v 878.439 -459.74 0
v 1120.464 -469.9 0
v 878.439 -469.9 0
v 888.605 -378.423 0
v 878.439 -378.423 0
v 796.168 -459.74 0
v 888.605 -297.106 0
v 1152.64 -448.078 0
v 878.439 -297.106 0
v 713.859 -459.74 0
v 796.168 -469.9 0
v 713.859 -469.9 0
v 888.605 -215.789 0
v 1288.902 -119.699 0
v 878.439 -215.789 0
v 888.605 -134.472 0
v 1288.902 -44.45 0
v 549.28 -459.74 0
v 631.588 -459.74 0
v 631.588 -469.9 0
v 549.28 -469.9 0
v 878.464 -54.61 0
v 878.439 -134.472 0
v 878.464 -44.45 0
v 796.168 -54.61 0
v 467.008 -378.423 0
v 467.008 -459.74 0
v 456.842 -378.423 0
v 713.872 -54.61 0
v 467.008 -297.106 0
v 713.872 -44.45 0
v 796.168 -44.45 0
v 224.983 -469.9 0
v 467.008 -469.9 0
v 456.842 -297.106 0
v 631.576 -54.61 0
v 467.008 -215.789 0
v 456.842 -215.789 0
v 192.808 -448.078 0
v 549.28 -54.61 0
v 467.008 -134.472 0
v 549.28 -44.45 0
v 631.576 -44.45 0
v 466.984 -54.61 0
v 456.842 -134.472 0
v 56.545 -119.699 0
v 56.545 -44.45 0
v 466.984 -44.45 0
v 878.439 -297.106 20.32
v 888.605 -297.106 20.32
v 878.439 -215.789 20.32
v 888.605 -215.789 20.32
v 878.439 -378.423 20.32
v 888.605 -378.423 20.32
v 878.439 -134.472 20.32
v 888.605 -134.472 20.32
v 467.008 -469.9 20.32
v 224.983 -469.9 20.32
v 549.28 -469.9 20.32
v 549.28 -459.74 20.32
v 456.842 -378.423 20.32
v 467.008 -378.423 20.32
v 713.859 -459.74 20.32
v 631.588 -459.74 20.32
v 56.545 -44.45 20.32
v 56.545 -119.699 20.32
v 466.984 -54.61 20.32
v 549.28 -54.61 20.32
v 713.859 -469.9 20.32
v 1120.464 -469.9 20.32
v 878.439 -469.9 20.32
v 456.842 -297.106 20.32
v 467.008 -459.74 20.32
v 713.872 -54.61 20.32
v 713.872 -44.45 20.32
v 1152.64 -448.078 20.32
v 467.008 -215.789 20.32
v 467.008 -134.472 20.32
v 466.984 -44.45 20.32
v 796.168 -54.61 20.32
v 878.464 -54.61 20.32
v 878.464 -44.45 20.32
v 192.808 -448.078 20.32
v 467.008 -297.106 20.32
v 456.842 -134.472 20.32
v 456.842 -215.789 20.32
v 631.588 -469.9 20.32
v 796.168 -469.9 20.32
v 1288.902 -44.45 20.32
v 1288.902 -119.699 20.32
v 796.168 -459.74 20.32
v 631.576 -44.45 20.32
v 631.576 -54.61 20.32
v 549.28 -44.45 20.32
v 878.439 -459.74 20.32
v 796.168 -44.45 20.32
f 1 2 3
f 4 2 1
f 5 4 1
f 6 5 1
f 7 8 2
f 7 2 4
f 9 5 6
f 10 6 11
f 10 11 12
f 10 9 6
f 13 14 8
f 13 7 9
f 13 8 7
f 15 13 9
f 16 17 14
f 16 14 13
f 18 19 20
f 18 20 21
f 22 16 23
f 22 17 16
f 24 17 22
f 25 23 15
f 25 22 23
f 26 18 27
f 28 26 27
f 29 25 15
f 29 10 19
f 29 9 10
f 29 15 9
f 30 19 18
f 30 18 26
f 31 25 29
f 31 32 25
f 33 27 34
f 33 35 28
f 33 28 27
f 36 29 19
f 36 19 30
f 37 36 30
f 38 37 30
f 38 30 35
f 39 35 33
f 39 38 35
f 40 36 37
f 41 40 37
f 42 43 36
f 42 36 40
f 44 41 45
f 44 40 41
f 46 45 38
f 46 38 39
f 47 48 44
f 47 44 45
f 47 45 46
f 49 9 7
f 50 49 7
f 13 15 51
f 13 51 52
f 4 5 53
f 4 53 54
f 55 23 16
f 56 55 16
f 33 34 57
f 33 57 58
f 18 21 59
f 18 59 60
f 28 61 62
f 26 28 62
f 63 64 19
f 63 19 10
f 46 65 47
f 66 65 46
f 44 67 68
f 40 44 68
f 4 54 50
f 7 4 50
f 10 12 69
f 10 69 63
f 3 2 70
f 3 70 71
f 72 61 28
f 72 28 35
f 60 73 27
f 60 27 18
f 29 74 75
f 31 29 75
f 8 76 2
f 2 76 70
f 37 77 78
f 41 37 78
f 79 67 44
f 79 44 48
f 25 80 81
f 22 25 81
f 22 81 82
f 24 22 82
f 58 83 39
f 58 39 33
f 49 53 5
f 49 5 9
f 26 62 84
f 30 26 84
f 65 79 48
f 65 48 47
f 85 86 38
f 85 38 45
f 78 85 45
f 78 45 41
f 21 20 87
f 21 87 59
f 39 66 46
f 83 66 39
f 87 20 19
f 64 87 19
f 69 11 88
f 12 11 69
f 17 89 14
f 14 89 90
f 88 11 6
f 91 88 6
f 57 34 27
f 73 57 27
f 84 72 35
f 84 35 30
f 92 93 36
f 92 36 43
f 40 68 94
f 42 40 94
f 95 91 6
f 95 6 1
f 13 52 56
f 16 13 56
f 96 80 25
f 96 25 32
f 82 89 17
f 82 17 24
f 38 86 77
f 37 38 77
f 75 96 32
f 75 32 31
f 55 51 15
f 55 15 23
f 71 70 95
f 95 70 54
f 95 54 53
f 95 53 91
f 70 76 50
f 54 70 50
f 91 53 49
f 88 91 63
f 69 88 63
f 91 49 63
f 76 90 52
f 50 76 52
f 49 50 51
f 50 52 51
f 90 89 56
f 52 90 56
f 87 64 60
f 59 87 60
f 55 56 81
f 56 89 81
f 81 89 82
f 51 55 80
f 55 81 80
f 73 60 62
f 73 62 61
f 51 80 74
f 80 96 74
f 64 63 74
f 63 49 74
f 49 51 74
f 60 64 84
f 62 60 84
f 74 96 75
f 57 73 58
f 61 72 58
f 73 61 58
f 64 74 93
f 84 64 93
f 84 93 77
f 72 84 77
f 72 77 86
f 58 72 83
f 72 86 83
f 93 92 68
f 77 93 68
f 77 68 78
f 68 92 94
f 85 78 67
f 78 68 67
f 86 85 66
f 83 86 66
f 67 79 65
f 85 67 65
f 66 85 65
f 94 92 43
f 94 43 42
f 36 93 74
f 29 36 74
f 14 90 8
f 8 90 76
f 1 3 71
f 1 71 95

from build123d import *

# Parameters (mm, degrees)
BOSS_EXTRUDE1_DEPTH = 20.32
SKETCH2_W           = 10.166490401
SKETCH2_H           = 81.316938585
SKETCH2_W_2         = 10.166490402
SKETCH2_H_2         = 81.316938584
SKETCH2_W_3         = 82.271298803
SKETCH2_H_3         = 10.16
CUT_EXTRUDE2_DEPTH  = 137.414
CUT_EXTRUDE3_DEPTH  = 21.3200001
SKETCH5_W           = 82.296
SKETCH5_H           = 10.16
CUT_EXTRUDE4_DEPTH  = 21.3200001
CUT_EXTRUDE5_DEPTH  = 21.3200001


with BuildPart() as part:
    # Sketch1 → Boss-Extrude1 (new body)
    with BuildSketch(Plane.XY):
        with BuildLine():
            Line((0, 0), (1345.447057269, 0))
            Line((1345.447057269, 0), (1156.937235756, -454.288839135))
            add(Edge.make_bspline(
                [(1156.937235756, -454.288839135), (1155.965204773, -456.631331547), (1154.630956054, -458.816896883), (1152.225947859, -461.69350105), (1151.355065983, -462.590813772), (1149.473312624, -464.260936999), (1148.45987476, -465.033112958), (1146.360299176, -466.401155283), (1145.26635201, -467.004685932), (1142.990856866, -468.052074807), (1141.798989191, -468.498505895), (1138.174492983, -469.560599459), (1135.699262078, -469.911644948), (1133.16419506, -469.9)],
                knots=[0, 0, 0, 0, 0.25, 0.25, 0.375, 0.375, 0.5, 0.5, 0.625, 0.625, 0.75, 0.75, 1, 1, 1, 1], degree=3))
            Line((1133.16419506, -469.9), (212.282862208, -469.9))
            add(Edge.make_bspline(
                [(188.509821513, -454.288839135), (189.481852496, -456.631331547), (190.816101215, -458.816896883), (193.22110941, -461.69350105), (194.091991286, -462.590813772), (195.973744645, -464.260936999), (196.987182509, -465.033112958), (199.086758093, -466.401155283), (200.180705259, -467.004685932), (202.456200403, -468.052074807), (203.648068078, -468.498505895), (207.272564286, -469.560599459), (209.747795191, -469.911644948), (212.282862208, -469.9)],
                knots=[0, 0, 0, 0, 0.25, 0.25, 0.375, 0.375, 0.5, 0.5, 0.625, 0.625, 0.75, 0.75, 1, 1, 1, 1], degree=3))
            Line((188.509821513, -454.288839135), (0, 0))
        make_face()
    extrude(amount=BOSS_EXTRUDE1_DEPTH)

    # Sketch2 → Cut-Extrude2 (cut)
    with BuildSketch(Plane.XY.offset(20.32)):
        with Locations((461.924984631, -337.764592123)):
            Rectangle(SKETCH2_W, SKETCH2_H)
        with Locations((883.522072638, -337.764592123)):
            Rectangle(SKETCH2_W_2, SKETCH2_H)
        with Locations((883.522072638, -175.130714953)):
            Rectangle(SKETCH2_W_2, SKETCH2_H_2)
        with Locations((461.924984631, -175.130714953)):
            Rectangle(SKETCH2_W, SKETCH2_H_2)
        with Locations((837.303178036, -464.82)):
            Rectangle(SKETCH2_W_3, SKETCH2_H_3)
        with Locations((672.723528635, -464.82)):
            Rectangle(SKETCH2_W_3, SKETCH2_H_3)
        with Locations((508.143879233, -464.82)):
            Rectangle(SKETCH2_W_3, SKETCH2_H_3)
    extrude(amount=-CUT_EXTRUDE2_DEPTH, mode=Mode.SUBTRACT)

    # Sketch4 → Cut-Extrude3 (cut, through all)
    with BuildSketch(Plane.XY.offset(20.32)):
        Polygon((0, 0), (1345.447057269, 0), (1327.002268746, -44.45), (18.444788523, -44.45), align=None)
    extrude(amount=-CUT_EXTRUDE3_DEPTH, mode=Mode.SUBTRACT)

    # Sketch5 → Cut-Extrude4 (cut, through all)
    with BuildSketch(Plane.XY.offset(20.32)):
        with Locations((508.131528634, -49.53)):
            Rectangle(SKETCH5_W, SKETCH5_H)
        with Locations((672.723528634, -49.53)):
            Rectangle(SKETCH5_W, SKETCH5_H)
        with Locations((837.315528634, -49.53)):
            Rectangle(SKETCH5_W, SKETCH5_H)
    extrude(amount=-CUT_EXTRUDE4_DEPTH, mode=Mode.SUBTRACT)

    # Sketch6 → Cut-Extrude5 (cut, through all)
    with BuildSketch(Plane.XY.offset(20.32)):
        Polygon((192.807539001, -448.077869782), (224.982862208, -469.9), (232.080223429, -549.766419732), (-59.510742861, -242.335130221), (-120.238907144, 37.382474964), (56.544788523, -44.45), (56.544788523, -119.698975594), align=None)
        Polygon((1120.46419506, -469.9), (1113.36683384, -549.766419732), (1404.95780013, -242.335130221), (1465.685964413, 37.382474964), (1288.902268746, -44.45), (1288.902268746, -119.698975594), (1152.639518267, -448.077869782), align=None)
    extrude(amount=-CUT_EXTRUDE5_DEPTH, mode=Mode.SUBTRACT)


solid = part.part
